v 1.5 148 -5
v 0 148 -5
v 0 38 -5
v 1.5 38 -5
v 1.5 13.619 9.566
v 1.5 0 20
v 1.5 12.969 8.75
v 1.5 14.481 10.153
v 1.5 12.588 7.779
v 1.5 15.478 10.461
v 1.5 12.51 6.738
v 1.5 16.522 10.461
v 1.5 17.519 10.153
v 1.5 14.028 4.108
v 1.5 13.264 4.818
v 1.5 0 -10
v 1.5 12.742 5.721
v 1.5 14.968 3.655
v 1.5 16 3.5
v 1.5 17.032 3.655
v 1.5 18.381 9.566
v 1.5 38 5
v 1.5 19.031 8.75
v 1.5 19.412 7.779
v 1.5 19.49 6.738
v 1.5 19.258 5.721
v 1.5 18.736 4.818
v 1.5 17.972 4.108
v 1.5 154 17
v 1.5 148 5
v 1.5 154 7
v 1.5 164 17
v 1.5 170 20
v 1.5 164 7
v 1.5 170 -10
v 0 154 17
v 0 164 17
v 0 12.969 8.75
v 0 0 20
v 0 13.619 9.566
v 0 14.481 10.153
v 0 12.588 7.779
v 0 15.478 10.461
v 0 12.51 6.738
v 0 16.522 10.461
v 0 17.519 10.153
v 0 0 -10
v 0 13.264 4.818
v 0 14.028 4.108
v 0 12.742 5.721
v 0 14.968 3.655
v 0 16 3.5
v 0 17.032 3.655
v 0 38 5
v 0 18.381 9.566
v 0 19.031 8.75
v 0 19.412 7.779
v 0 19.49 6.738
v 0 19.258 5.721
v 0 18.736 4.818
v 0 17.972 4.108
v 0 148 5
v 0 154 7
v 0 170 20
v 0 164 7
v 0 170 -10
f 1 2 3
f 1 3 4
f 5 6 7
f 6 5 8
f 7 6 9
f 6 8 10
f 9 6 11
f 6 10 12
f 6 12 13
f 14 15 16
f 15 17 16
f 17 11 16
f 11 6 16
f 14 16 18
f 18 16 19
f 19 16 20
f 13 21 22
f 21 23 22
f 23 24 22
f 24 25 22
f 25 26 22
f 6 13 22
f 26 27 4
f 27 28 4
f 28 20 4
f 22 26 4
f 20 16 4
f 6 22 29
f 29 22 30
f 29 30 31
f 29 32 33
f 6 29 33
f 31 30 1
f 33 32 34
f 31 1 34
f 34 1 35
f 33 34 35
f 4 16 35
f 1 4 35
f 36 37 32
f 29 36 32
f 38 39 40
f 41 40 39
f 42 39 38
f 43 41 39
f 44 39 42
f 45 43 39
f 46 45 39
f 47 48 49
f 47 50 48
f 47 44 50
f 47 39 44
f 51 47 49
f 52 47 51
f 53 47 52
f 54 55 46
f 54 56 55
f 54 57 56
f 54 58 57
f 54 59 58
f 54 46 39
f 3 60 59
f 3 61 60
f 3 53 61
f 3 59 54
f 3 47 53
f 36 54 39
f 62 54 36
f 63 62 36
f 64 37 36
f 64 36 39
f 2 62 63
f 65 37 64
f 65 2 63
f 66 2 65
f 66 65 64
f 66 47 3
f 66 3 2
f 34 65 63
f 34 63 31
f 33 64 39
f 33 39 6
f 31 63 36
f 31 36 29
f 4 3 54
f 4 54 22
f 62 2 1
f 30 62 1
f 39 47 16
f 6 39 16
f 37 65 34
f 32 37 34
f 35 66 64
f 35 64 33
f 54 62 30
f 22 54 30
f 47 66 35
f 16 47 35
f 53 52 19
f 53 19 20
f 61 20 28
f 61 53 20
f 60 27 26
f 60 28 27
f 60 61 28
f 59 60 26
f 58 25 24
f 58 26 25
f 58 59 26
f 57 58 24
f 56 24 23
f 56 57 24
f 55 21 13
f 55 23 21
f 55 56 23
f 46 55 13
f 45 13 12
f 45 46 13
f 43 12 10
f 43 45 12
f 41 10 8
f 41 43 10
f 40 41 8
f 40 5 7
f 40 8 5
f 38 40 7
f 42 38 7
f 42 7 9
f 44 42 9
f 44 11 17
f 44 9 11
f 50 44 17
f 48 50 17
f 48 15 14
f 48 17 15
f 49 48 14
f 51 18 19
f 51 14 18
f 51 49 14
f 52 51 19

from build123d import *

# Parameters (mm, degrees)
BOX021_W          = 10
BOX021_H          = 10
BOX021_DEPTH      = 10
BOX004_W          = 10
BOX004_H          = 110
BOX004_DEPTH      = 10
CYLINDER004_R     = 3.5
CYLINDER004_DEPTH = 10
BOX002_W          = 1.5
BOX002_H          = 170
BOX002_DEPTH      = 30


with BuildPart() as reset:
    # Box021 → Box021 (new body)
    with BuildSketch(Plane(origin=(-2, 154, 7), x_dir=(1, 0, 0), z_dir=(0, 0, 1))):
        with Locations((5, 5)):
            Rectangle(BOX021_W, BOX021_H)
    extrude(amount=BOX021_DEPTH)


with BuildPart() as cube003:
    # Box004 → Box004 (new body)
    with BuildSketch(Plane(origin=(-3, 38, -5), x_dir=(1, 0, 0), z_dir=(0, 0, 1))):
        with Locations((5, 55)):
            Rectangle(BOX004_W, BOX004_H)
    extrude(amount=BOX004_DEPTH)


with BuildPart() as pwrjack:
    # Cylinder004 → Cylinder004 (new body)
    with BuildSketch(Plane(origin=(-3, 16, 7), x_dir=(0, 0, -1), z_dir=(1, 0, 0))):
        Circle(CYLINDER004_R)
    extrude(amount=CYLINDER004_DEPTH)


with BuildPart() as cut006:
    # Box002 → Box002 (new body)
    with BuildSketch(Plane.XY.offset(-10)):
        with Locations((0.75, 85)):
            Rectangle(BOX002_W, BOX002_H)
    extrude(amount=BOX002_DEPTH)

    # Cut003: cut pwrjack
    add(pwrjack.part, mode=Mode.SUBTRACT)

    # Cut: cut Cube003
    add(cube003.part, mode=Mode.SUBTRACT)

    # Cut006: cut reset
    add(reset.part, mode=Mode.SUBTRACT)


solid = cut006.part
